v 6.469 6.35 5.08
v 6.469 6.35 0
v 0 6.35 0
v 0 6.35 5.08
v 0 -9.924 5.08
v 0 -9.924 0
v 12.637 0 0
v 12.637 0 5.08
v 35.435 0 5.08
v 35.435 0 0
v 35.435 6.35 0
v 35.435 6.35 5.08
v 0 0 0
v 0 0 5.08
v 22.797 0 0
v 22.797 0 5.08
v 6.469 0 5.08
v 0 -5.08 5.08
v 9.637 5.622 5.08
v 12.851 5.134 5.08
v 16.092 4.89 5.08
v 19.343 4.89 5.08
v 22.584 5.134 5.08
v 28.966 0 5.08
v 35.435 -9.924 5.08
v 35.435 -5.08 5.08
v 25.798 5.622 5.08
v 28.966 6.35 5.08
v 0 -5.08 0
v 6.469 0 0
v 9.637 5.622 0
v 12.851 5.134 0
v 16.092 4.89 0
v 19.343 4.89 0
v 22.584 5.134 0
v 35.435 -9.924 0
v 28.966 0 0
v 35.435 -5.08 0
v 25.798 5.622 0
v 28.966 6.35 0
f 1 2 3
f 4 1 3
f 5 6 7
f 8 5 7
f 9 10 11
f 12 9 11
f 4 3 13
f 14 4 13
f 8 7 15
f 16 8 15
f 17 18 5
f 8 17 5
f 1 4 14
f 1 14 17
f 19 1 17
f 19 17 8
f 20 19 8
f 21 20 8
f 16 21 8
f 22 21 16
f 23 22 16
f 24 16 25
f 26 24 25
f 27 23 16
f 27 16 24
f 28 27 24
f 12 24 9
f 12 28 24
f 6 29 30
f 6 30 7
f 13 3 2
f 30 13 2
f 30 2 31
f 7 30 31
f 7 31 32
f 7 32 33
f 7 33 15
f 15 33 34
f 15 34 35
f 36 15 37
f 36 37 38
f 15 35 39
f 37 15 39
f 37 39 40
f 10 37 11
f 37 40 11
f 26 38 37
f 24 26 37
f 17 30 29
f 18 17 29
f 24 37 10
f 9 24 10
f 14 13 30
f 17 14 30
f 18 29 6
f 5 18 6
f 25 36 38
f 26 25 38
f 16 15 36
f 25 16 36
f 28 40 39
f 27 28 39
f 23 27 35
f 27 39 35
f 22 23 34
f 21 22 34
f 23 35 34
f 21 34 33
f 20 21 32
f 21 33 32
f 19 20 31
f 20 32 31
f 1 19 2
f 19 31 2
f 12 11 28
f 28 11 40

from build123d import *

# Parameters (mm, degrees)
BOSS_EXTRUDE1_DEPTH = 5.08


with BuildPart() as part:
    # Sketch1 → Boss-Extrude1 (new body)
    with BuildSketch(Plane.XY):
        with BuildLine():
            Line((6.468659765, 0), (0, -5.08))
            Line((0, -5.08), (0, -9.924449534))
            Line((0, -9.924449534), (12.637379407, 0))
            Line((12.637379407, 0), (22.797379407, 0))
            Line((22.797379407, 0), (35.434758815, -9.924449534))
            Line((35.434758815, -9.924449534), (35.434758815, -5.08))
            Line((35.434758815, -5.08), (28.96609905, 0))
            Line((28.96609905, 0), (35.434758815, 0))
            Line((35.434758815, 0), (35.434758815, 6.35))
            Line((35.434758815, 6.35), (28.96609905, 6.35))
            ThreePointArc((28.96609905, 6.35), (17.717379407, 4.859071786), (6.468659765, 6.35))
            Line((6.468659765, 6.35), (0, 6.35))
            Line((0, 6.35), (0, 0))
            Line((0, 0), (6.468659765, 0))
        make_face()
    extrude(amount=BOSS_EXTRUDE1_DEPTH)


solid = part.part
